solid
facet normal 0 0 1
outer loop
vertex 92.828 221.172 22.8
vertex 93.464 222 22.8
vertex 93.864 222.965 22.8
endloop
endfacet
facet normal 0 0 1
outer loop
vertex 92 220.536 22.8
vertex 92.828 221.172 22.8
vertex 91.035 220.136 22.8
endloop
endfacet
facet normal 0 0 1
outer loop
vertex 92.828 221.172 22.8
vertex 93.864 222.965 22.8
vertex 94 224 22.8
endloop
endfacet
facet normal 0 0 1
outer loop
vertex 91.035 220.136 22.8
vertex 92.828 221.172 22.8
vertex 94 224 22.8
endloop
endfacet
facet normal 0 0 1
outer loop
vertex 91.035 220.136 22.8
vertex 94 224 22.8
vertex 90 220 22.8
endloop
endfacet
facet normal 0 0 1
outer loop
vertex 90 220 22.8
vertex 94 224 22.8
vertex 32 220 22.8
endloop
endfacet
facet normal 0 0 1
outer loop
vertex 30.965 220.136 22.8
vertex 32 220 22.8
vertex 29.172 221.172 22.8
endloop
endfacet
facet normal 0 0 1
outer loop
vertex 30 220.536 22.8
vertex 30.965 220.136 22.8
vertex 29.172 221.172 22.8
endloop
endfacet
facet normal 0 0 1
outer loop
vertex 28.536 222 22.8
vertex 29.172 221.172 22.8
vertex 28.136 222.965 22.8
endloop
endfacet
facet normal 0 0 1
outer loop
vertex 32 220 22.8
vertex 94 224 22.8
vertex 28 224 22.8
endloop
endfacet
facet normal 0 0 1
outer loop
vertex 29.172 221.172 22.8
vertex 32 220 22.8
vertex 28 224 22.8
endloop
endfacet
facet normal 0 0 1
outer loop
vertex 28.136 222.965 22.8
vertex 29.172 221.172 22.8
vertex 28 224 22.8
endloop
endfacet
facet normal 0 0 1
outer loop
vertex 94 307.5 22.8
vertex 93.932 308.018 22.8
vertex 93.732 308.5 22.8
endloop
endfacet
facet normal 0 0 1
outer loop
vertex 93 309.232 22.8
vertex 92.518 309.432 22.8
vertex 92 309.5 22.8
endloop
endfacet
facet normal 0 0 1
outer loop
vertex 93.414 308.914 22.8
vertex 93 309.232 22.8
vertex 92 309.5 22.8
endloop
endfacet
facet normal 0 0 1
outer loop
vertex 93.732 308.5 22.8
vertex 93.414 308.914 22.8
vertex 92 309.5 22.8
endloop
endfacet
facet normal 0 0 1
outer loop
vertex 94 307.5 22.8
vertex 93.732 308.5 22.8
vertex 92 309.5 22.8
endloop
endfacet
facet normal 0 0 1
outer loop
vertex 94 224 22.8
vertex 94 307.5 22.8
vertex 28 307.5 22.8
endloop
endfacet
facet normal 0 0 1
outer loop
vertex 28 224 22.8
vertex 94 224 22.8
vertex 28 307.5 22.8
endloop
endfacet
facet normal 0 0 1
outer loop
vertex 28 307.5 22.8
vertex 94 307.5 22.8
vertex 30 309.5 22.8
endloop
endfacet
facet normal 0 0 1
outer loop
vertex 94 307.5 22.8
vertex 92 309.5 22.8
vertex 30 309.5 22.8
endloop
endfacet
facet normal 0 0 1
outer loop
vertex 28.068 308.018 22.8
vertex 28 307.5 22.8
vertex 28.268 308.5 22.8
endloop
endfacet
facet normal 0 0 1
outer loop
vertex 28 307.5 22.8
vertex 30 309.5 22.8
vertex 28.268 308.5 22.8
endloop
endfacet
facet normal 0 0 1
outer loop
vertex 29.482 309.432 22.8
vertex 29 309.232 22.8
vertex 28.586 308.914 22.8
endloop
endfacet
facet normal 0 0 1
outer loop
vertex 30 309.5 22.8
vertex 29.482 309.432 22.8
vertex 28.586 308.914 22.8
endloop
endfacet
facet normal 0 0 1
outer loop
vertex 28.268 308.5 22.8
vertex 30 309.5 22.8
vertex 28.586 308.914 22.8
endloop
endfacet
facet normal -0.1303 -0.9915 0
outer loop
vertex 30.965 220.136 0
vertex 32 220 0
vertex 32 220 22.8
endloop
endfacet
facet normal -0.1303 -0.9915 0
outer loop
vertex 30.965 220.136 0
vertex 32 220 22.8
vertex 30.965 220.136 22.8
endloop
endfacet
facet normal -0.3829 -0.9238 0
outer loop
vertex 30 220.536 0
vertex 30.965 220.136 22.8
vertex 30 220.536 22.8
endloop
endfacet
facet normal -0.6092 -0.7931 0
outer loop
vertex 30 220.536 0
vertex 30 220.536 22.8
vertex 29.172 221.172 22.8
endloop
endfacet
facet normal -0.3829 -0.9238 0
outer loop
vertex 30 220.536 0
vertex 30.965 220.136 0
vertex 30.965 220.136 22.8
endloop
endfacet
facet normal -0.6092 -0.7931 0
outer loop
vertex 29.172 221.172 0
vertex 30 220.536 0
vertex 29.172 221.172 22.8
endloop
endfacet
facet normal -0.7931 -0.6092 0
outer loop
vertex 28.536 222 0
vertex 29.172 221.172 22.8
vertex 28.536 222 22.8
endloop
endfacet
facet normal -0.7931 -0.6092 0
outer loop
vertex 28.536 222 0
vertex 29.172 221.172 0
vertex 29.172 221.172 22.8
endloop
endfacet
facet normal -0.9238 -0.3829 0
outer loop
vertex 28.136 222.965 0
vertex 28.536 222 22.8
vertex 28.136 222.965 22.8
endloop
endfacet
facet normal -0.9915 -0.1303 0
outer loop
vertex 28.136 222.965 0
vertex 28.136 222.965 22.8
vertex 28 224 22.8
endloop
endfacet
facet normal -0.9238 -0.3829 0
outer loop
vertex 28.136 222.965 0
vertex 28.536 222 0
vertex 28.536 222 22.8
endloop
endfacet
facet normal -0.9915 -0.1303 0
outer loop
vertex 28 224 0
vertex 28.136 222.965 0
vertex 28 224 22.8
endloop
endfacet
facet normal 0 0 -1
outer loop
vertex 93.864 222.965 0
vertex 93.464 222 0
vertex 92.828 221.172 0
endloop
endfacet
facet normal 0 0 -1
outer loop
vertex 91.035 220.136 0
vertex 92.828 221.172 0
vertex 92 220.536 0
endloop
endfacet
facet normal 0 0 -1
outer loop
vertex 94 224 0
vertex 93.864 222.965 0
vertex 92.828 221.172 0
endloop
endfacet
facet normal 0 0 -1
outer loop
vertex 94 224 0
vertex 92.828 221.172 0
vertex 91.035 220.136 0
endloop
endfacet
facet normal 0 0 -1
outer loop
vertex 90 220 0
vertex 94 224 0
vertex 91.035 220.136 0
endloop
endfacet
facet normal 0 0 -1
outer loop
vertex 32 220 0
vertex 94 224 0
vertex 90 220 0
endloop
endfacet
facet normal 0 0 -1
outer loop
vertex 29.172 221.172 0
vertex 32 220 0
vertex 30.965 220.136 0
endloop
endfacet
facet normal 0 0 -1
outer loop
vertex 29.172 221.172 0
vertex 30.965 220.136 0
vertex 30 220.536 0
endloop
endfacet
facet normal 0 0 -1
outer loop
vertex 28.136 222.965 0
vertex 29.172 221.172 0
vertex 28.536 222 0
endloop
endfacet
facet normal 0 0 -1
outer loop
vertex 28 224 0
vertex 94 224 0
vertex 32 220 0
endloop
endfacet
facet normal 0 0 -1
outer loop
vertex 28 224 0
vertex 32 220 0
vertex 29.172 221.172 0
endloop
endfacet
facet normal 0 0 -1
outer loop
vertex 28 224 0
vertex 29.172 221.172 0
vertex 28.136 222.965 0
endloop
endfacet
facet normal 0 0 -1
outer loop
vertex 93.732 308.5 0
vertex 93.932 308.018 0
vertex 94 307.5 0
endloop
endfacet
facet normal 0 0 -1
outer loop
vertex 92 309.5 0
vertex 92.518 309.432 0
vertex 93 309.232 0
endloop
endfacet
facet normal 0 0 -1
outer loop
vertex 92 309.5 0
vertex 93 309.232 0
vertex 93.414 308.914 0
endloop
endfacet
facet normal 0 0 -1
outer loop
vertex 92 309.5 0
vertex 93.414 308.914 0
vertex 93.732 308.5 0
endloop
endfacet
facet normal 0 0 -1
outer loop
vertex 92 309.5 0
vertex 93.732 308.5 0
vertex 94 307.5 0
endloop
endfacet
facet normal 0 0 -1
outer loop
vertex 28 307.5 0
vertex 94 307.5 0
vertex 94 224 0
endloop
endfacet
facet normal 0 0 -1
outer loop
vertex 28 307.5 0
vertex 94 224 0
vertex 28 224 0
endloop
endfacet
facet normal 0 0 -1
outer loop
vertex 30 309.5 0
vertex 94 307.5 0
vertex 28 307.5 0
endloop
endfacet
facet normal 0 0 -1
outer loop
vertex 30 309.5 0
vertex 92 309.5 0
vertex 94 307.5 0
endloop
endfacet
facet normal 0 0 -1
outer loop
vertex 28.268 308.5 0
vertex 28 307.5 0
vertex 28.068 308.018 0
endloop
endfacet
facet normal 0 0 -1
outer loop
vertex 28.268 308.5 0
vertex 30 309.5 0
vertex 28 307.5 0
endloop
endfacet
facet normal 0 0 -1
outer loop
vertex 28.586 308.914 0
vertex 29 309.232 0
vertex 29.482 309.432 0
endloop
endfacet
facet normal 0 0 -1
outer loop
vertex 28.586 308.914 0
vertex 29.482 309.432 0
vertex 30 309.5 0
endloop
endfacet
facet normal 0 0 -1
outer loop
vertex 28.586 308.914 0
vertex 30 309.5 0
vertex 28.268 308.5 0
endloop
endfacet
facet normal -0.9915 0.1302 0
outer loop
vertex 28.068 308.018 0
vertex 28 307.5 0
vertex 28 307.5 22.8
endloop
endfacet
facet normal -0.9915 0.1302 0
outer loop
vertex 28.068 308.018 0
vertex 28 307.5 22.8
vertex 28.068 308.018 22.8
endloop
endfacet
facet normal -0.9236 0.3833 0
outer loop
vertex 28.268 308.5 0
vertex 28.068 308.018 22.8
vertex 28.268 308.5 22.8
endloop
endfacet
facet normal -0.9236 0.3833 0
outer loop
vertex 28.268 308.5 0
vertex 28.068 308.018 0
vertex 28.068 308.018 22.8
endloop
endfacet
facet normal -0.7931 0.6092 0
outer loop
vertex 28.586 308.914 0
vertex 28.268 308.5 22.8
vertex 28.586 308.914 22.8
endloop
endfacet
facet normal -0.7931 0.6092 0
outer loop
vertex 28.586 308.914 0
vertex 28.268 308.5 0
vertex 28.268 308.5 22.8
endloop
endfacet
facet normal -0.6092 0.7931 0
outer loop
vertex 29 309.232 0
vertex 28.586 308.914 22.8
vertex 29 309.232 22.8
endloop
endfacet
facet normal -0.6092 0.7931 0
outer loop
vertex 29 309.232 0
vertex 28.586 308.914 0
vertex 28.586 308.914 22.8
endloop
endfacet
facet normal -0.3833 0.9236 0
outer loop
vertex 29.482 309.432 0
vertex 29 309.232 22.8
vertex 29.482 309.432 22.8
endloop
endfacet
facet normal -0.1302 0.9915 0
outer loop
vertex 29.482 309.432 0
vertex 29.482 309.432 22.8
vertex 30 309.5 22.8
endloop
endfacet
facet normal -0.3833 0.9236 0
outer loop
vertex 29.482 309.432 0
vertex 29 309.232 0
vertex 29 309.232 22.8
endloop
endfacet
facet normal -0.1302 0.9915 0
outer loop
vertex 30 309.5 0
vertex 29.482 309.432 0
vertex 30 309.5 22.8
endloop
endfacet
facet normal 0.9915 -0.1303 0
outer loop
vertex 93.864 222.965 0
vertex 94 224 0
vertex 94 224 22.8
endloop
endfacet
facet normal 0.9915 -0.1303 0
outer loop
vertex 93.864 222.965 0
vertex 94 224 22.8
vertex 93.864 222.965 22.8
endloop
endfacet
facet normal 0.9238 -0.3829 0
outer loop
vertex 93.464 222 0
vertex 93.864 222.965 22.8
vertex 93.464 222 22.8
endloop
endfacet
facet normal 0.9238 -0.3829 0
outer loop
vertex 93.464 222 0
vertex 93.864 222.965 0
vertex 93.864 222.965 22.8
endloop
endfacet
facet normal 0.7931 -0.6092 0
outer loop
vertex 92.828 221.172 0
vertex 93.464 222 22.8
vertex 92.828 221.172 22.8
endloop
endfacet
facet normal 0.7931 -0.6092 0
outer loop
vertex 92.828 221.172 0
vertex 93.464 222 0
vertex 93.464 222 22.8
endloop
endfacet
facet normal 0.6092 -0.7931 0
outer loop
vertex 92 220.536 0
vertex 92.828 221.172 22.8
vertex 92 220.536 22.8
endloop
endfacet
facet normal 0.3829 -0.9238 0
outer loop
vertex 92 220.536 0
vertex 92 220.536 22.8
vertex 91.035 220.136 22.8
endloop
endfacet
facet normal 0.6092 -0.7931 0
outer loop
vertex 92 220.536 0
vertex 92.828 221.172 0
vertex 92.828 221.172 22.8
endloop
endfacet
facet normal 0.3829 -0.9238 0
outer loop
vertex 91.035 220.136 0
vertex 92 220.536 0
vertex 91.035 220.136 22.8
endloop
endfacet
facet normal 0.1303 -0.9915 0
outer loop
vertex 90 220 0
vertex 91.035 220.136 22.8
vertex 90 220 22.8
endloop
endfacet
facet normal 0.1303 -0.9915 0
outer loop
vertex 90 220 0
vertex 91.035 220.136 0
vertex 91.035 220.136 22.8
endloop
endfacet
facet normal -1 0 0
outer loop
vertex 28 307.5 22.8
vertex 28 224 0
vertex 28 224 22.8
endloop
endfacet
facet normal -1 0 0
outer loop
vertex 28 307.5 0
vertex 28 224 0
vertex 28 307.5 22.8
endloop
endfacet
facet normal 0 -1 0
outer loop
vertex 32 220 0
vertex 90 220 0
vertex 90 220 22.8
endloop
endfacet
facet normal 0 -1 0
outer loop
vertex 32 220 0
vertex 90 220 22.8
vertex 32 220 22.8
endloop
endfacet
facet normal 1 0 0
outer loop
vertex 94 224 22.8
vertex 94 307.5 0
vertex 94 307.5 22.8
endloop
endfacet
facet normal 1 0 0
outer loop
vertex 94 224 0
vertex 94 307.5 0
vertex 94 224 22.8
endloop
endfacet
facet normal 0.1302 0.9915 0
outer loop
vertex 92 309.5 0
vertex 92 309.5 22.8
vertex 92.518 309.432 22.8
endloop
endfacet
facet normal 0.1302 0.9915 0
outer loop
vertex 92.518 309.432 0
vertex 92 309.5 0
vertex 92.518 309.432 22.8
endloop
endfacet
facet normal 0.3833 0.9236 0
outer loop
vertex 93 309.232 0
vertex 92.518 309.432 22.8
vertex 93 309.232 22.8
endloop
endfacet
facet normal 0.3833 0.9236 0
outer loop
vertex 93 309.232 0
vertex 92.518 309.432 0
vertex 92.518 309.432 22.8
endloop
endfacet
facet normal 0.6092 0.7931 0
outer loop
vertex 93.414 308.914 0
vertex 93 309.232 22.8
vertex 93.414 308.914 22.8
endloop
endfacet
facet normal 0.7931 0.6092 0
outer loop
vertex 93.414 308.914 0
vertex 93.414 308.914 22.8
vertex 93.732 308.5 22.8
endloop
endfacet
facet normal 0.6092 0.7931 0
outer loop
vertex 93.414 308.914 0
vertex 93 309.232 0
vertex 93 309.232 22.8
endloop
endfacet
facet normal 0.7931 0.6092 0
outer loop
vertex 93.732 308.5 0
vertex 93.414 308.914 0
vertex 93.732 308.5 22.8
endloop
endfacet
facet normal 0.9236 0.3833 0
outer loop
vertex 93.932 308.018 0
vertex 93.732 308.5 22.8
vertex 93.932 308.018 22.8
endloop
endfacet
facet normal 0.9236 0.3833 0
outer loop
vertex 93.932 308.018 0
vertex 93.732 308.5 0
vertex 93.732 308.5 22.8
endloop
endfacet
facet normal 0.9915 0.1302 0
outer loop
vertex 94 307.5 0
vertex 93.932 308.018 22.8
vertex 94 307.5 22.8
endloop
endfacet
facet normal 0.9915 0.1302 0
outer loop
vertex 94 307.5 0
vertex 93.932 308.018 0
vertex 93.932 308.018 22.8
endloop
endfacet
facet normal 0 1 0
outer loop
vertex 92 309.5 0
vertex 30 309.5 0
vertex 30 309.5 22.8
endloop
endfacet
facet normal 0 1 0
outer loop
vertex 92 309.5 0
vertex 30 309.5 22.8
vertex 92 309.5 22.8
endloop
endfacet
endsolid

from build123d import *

# Parameters (mm, degrees)
BOSS_EXTRUDE1_DEPTH = 22.8


with BuildPart() as part:
    # Sketch1 → Boss-Extrude1 (new body)
    with BuildSketch(Plane.XY):
        with BuildLine():
            Line((28, 250), (28, 307.5))
            ThreePointArc((28, 307.5), (28.585786438, 308.914213563), (30, 309.5))
            Line((30, 309.5), (30.5, 309.5))
            Line((30.5, 309.5), (91.5, 309.5))
            Line((91.5, 309.5), (92, 309.5))
            ThreePointArc((92, 309.5), (93.414213562, 308.914213563), (94, 307.5))
            Line((94, 307.5), (94, 250))
            Line((94, 250), (94, 224))
            ThreePointArc((94, 224), (92.828427125, 221.171572875), (90, 220))
            Line((90, 220), (32, 220))
            ThreePointArc((32, 220), (29.171572875, 221.171572875), (28, 224))
            Line((28, 224), (28, 250))
        make_face()
    extrude(amount=BOSS_EXTRUDE1_DEPTH)


solid = part.part
